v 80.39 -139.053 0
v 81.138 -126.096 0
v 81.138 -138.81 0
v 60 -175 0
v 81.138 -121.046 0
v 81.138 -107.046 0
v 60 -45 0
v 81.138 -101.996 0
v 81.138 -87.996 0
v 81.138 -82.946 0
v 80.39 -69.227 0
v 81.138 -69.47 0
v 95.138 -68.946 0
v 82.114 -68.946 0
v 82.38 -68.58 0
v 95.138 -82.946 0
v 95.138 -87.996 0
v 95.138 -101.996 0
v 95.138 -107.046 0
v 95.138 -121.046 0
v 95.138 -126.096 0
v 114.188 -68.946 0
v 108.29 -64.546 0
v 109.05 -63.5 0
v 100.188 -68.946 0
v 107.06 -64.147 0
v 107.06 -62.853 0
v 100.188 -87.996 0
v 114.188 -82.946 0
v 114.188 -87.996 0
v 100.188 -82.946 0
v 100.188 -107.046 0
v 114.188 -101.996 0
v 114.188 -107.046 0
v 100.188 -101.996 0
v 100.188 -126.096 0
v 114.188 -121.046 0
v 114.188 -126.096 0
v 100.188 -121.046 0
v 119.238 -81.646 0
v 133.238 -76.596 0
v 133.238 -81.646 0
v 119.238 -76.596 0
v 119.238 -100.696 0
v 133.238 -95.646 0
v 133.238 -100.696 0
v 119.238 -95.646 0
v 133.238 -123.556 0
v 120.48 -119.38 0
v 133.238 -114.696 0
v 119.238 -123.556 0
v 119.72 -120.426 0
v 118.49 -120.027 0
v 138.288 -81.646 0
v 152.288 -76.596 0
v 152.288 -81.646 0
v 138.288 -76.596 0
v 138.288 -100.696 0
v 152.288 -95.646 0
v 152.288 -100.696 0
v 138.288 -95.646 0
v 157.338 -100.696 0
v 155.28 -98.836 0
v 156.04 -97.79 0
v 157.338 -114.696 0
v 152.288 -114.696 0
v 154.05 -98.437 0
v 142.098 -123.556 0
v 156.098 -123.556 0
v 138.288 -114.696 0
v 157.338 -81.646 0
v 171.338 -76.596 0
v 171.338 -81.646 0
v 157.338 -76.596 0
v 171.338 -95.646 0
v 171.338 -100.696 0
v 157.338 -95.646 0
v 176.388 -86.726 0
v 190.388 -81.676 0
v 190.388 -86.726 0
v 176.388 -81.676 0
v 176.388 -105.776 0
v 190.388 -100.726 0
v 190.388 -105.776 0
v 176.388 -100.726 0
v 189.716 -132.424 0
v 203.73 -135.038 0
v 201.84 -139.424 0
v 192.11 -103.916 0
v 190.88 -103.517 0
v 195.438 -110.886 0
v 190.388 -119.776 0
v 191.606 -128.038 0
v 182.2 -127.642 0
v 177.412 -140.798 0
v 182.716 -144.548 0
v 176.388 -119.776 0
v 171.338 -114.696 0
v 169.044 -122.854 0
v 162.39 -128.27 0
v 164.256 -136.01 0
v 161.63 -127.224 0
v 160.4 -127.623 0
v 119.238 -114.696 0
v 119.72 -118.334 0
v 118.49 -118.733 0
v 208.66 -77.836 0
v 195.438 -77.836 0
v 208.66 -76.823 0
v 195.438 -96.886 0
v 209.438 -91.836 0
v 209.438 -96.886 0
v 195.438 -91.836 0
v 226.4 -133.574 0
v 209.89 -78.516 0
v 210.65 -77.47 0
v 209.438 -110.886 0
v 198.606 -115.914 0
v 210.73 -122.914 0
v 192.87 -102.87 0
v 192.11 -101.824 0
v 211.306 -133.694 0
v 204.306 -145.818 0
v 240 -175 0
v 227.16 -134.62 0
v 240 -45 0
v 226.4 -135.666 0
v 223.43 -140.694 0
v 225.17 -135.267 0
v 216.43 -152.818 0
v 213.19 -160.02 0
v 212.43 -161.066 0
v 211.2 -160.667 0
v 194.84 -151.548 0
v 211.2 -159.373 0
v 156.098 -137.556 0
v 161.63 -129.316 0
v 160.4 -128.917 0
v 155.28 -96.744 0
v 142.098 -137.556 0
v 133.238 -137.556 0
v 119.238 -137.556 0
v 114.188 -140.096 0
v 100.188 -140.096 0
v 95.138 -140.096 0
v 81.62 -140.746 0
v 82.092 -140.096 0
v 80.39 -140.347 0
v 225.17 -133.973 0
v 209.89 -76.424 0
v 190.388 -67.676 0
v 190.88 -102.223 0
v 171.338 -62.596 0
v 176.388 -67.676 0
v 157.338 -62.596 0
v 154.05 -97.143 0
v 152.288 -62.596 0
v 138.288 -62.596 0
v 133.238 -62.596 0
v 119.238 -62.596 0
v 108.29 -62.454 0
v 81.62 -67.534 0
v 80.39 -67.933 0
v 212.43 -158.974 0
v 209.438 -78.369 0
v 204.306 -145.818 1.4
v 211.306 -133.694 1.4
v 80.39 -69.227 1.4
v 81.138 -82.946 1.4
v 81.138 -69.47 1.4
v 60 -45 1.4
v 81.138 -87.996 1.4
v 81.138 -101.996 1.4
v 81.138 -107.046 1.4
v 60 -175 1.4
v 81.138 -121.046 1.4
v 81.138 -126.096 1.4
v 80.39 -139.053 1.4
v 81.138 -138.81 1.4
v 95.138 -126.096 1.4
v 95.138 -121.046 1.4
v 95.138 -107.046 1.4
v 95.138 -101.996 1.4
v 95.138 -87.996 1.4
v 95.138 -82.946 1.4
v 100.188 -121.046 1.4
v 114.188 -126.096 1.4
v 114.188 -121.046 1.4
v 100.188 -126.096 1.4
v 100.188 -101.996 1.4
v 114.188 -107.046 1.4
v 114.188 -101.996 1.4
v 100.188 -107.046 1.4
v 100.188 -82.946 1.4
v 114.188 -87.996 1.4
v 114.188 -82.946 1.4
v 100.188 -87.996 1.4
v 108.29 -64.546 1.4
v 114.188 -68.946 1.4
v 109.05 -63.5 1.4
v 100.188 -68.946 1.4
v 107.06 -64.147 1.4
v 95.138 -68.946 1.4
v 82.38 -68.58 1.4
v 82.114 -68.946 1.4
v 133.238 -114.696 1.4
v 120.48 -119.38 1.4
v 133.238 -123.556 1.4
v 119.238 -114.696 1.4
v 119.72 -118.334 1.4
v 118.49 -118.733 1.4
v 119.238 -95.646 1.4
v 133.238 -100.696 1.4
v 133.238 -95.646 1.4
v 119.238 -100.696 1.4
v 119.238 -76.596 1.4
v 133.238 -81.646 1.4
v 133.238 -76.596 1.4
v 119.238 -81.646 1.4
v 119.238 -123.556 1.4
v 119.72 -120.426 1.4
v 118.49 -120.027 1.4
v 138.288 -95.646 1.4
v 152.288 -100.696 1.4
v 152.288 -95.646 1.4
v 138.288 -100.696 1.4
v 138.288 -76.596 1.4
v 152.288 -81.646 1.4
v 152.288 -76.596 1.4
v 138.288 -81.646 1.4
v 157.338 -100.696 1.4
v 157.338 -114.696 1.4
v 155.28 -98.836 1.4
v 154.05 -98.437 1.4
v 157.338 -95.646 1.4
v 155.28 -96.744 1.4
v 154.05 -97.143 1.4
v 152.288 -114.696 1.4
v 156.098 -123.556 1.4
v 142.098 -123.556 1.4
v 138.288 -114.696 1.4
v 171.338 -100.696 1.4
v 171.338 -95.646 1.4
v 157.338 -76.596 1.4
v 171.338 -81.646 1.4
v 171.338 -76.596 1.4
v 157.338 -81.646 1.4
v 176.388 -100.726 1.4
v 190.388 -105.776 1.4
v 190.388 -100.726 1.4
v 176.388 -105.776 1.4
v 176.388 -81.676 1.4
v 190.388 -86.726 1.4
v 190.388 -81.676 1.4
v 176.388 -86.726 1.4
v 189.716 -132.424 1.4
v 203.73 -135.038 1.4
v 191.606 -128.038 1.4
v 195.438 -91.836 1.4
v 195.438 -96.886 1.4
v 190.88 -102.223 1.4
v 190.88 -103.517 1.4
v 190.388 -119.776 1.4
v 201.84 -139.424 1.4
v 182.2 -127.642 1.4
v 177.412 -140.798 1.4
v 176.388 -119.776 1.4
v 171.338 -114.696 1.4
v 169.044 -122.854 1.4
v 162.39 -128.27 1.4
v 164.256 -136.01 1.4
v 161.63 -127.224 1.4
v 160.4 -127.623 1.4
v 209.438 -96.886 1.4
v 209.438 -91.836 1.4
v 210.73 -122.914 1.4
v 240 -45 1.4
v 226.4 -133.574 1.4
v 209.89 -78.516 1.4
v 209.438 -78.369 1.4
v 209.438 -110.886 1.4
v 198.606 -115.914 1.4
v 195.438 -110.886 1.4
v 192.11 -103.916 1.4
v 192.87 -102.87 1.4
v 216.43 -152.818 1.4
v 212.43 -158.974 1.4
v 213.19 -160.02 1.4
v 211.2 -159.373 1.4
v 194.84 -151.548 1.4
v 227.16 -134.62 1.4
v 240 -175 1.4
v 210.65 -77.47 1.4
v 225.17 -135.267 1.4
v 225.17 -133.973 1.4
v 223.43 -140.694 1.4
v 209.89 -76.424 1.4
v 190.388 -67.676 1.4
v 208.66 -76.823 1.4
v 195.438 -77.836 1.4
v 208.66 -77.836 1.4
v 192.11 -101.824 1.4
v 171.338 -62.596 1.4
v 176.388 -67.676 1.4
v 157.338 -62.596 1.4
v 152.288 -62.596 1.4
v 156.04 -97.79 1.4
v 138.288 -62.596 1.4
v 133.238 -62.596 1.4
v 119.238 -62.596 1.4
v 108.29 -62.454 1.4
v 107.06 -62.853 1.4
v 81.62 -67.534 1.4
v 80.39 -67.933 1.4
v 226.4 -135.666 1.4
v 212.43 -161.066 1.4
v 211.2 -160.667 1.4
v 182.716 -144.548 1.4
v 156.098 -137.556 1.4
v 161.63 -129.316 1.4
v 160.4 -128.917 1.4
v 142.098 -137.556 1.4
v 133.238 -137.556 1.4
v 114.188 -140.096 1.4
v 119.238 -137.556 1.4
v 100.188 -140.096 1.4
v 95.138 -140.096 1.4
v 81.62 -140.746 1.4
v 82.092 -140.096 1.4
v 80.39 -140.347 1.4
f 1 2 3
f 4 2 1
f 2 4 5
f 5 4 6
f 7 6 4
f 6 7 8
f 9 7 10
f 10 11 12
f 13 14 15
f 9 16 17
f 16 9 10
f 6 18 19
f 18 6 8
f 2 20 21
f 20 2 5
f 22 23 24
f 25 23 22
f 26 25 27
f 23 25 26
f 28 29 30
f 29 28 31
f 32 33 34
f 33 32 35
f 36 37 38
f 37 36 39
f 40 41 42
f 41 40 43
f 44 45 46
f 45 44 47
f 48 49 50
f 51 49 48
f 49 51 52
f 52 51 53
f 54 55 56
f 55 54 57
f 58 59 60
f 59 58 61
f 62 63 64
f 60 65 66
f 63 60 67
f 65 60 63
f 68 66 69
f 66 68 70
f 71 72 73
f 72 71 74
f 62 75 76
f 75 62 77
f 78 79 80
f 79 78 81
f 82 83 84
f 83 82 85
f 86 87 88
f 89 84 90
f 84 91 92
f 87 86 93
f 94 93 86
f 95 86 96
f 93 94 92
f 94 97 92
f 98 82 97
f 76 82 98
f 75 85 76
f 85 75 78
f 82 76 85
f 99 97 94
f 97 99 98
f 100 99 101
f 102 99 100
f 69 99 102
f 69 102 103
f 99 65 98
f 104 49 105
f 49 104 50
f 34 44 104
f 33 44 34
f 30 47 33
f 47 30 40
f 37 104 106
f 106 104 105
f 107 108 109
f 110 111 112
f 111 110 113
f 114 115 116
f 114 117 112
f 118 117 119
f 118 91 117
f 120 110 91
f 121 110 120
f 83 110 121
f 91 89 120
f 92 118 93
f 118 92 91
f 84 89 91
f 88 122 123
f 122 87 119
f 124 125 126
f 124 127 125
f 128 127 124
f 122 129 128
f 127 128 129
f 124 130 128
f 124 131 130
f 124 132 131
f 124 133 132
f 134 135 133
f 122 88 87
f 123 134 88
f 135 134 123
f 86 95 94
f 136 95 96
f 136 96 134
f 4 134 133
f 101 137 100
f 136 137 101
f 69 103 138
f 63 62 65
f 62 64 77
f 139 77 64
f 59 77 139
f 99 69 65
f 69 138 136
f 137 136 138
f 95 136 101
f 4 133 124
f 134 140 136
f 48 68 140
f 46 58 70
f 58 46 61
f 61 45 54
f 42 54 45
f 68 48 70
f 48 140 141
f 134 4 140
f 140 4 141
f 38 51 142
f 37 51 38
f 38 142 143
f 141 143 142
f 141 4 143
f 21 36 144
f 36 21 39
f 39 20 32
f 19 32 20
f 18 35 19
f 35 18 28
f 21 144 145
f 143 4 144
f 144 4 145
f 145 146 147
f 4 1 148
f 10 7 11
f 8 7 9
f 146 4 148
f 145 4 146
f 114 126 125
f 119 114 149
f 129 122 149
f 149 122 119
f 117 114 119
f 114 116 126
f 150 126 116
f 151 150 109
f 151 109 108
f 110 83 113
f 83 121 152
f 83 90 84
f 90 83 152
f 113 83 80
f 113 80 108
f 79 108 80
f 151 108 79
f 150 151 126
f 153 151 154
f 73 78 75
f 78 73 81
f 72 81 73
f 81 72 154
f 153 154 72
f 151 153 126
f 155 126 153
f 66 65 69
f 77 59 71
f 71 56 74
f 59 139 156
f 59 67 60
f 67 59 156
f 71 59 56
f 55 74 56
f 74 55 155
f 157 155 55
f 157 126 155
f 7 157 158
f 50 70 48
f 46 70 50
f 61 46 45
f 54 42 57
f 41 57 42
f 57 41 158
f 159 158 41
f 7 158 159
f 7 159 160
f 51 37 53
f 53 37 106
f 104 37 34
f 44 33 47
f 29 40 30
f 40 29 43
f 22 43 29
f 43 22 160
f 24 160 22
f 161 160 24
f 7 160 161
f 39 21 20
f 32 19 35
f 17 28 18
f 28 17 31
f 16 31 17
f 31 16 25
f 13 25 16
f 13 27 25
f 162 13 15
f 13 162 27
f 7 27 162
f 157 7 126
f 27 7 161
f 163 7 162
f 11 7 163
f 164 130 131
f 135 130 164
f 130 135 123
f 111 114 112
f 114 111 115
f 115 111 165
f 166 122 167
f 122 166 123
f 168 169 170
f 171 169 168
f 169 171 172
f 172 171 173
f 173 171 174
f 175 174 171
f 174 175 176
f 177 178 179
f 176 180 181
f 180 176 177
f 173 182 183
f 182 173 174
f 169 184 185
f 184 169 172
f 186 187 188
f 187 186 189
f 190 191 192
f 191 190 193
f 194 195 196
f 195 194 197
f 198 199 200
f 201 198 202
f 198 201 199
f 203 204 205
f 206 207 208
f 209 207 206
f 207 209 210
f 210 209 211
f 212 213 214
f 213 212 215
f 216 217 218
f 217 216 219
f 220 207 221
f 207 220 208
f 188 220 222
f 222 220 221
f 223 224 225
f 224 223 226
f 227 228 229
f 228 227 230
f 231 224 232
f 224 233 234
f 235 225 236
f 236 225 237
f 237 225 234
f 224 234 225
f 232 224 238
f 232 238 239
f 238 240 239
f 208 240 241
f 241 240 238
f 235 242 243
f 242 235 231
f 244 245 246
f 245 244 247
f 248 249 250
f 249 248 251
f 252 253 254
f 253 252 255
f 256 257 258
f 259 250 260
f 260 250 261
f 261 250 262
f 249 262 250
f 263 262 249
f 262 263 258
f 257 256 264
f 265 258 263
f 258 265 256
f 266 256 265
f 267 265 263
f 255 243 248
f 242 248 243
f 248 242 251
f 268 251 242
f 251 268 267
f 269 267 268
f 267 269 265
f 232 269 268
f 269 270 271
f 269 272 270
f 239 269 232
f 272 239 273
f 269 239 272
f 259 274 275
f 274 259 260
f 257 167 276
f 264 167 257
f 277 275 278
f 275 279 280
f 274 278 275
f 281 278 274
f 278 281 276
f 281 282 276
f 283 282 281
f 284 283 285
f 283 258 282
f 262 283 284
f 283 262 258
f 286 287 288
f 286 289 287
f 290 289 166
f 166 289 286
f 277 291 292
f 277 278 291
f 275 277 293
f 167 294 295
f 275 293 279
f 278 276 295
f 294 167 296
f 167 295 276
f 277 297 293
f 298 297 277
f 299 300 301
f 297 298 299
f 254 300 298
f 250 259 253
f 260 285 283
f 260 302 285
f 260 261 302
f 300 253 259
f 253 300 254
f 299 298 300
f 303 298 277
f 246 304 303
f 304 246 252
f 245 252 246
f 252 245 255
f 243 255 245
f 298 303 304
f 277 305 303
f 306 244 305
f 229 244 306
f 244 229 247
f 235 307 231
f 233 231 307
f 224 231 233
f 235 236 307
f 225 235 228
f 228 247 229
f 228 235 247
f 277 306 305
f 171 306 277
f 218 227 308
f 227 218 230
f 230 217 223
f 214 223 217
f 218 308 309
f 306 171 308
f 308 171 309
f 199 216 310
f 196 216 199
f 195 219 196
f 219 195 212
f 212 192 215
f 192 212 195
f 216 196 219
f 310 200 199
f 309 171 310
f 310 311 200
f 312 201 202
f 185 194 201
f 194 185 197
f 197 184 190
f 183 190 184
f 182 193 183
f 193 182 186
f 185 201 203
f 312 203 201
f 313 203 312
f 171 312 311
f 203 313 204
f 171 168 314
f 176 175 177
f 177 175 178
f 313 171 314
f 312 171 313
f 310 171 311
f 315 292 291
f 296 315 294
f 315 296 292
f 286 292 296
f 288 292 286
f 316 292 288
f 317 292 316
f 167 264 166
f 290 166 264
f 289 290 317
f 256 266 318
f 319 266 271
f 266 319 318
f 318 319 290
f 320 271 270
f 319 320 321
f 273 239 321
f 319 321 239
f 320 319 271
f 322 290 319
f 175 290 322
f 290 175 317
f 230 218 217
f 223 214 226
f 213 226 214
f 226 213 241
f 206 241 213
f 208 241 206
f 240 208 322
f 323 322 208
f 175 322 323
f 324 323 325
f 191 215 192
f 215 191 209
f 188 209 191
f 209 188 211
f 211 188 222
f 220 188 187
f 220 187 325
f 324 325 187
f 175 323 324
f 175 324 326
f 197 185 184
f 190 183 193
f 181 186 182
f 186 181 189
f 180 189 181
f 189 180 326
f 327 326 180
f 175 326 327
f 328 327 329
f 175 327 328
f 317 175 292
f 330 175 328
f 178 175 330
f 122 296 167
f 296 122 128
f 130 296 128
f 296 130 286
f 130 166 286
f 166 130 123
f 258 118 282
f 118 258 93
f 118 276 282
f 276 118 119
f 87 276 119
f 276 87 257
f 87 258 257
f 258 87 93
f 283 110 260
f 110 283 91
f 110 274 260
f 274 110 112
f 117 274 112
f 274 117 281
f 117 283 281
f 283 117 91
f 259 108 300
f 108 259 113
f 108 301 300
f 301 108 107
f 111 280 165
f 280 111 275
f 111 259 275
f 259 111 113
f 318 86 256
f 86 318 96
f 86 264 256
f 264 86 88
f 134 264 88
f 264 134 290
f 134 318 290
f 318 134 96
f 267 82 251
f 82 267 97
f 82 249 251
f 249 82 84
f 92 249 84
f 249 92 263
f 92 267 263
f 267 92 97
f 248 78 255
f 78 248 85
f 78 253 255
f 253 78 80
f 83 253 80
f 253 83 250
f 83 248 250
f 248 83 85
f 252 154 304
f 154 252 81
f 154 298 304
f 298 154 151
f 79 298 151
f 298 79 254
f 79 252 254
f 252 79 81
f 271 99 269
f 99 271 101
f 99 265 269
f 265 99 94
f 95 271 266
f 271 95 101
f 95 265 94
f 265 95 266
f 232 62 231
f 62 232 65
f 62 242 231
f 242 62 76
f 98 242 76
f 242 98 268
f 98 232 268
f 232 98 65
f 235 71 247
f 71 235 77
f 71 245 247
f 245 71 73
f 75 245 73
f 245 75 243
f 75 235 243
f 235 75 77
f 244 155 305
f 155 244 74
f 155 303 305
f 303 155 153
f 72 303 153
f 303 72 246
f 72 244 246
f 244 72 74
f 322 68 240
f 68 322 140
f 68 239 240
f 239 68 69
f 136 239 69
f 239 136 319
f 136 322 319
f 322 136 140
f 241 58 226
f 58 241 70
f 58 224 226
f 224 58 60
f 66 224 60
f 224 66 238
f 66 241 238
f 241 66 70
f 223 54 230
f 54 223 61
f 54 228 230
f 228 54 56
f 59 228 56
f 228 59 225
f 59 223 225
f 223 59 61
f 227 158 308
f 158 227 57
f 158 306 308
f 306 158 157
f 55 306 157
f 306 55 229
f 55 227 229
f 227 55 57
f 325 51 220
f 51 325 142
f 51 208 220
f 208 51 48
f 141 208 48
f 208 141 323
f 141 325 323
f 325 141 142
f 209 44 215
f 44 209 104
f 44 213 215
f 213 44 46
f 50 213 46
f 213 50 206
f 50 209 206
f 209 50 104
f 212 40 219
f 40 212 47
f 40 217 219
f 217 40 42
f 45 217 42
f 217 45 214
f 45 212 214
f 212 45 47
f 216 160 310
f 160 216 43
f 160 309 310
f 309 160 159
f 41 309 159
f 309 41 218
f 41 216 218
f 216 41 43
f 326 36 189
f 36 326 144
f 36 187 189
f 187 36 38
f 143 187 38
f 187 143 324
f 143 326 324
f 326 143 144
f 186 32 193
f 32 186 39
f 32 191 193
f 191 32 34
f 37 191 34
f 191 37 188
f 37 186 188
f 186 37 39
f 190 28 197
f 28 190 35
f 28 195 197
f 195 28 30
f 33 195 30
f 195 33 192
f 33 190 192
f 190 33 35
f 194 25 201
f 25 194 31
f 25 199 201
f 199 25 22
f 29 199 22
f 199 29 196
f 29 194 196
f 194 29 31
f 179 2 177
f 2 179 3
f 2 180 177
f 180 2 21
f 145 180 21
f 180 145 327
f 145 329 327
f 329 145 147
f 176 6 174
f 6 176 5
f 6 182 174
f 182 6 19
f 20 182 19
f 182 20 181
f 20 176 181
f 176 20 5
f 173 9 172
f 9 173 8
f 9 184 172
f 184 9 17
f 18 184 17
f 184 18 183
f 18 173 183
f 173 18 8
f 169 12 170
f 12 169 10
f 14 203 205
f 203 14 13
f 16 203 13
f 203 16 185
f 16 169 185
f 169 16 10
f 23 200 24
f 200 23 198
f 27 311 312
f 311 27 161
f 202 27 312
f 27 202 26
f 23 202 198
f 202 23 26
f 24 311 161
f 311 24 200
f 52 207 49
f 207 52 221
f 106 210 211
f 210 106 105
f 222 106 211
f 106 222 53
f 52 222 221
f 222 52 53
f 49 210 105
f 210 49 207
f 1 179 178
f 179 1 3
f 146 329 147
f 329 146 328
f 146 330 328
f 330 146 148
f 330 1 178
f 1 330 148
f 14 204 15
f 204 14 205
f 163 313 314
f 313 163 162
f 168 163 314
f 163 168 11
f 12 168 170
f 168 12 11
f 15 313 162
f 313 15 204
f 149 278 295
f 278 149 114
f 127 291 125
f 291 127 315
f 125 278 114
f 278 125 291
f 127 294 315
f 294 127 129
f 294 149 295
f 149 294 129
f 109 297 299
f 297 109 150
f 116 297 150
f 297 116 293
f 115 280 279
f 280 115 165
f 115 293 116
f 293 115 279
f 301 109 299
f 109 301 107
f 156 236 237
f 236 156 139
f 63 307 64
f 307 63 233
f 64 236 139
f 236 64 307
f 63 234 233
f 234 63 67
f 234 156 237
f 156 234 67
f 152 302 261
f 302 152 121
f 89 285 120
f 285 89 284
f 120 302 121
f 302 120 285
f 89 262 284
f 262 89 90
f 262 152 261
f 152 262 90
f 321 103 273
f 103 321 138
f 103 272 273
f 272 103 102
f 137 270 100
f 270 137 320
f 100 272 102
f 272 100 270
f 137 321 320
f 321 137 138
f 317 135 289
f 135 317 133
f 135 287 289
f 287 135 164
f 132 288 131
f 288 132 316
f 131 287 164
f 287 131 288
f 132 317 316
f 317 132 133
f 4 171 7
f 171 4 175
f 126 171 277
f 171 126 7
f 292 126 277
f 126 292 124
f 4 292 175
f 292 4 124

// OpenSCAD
difference(){
    linear_extrude(1.4) translate(v = [150, -110, 0.0000000000]) square([180, 130], true);
    linear_extrude(1.4) import (file = "./right-Edge_Cuts.dxf");
union() {
	linear_extrude(height = 1.4000000000) {
		translate(v = [213.8680000000, -143.2560000000, 0.0000000000]) {
			rotate(a = 330, v = [0, 0, 1]) {
				square(center = true, size = 14);
			}
		}
	}
	linear_extrude(height = 1.4000000000) {
		translate(v = [201.1680000000, -125.4760000000, 0.0000000000]) {
			rotate(a = 330, v = [0, 0, 1]) {
				square(center = true, size = 14);
			}
		}
	}
	linear_extrude(height = 1.4000000000) {
		translate(v = [202.4380000000, -103.8860000000, 0.0000000000]) {
			square(center = true, size = 14);
		}
	}
	linear_extrude(height = 1.4000000000) {
		translate(v = [202.4380000000, -84.8360000000, 0.0000000000]) {
			square(center = true, size = 14);
		}
	}
	linear_extrude(height = 1.4000000000) {
		translate(v = [192.2780000000, -141.9860000000, 0.0000000000]) {
			rotate(a = 330, v = [0, 0, 1]) {
				square(center = true, size = 14);
			}
		}
	}
	linear_extrude(height = 1.4000000000) {
		translate(v = [183.3880000000, -112.7760000000, 0.0000000000]) {
			square(center = true, size = 14);
		}
	}
	linear_extrude(height = 1.4000000000) {
		translate(v = [183.3880000000, -93.7260000000, 0.0000000000]) {
			square(center = true, size = 14);
		}
	}
	linear_extrude(height = 1.4000000000) {
		translate(v = [183.3880000000, -74.6760000000, 0.0000000000]) {
			square(center = true, size = 14);
		}
	}
	linear_extrude(height = 1.4000000000) {
		translate(v = [173.2280000000, -131.8260000000, 0.0000000000]) {
			rotate(a = 340, v = [0, 0, 1]) {
				square(center = true, size = 14);
			}
		}
	}
	linear_extrude(height = 1.4000000000) {
		translate(v = [164.3380000000, -107.6960000000, 0.0000000000]) {
			square(center = true, size = 14);
		}
	}
	linear_extrude(height = 1.4000000000) {
		translate(v = [164.3380000000, -88.6460000000, 0.0000000000]) {
			square(center = true, size = 14);
		}
	}
	linear_extrude(height = 1.4000000000) {
		translate(v = [164.3380000000, -69.5960000000, 0.0000000000]) {
			square(center = true, size = 14);
		}
	}
	linear_extrude(height = 1.4000000000) {
		translate(v = [149.0980000000, -130.5560000000, 0.0000000000]) {
			square(center = true, size = 14);
		}
	}
	linear_extrude(height = 1.4000000000) {
		translate(v = [145.2880000000, -107.6960000000, 0.0000000000]) {
			square(center = true, size = 14);
		}
	}
	linear_extrude(height = 1.4000000000) {
		translate(v = [145.2880000000, -88.6460000000, 0.0000000000]) {
			square(center = true, size = 14);
		}
	}
	linear_extrude(height = 1.4000000000) {
		translate(v = [145.2880000000, -69.5960000000, 0.0000000000]) {
			square(center = true, size = 14);
		}
	}
	linear_extrude(height = 1.4000000000) {
		translate(v = [126.2380000000, -130.5560000000, 0.0000000000]) {
			square(center = true, size = 14);
		}
	}
	linear_extrude(height = 1.4000000000) {
		translate(v = [126.2380000000, -107.6960000000, 0.0000000000]) {
			square(center = true, size = 14);
		}
	}
	linear_extrude(height = 1.4000000000) {
		translate(v = [126.2380000000, -88.6460000000, 0.0000000000]) {
			square(center = true, size = 14);
		}
	}
	linear_extrude(height = 1.4000000000) {
		translate(v = [126.2380000000, -69.5960000000, 0.0000000000]) {
			square(center = true, size = 14);
		}
	}
	linear_extrude(height = 1.4000000000) {
		translate(v = [107.1880000000, -133.0960000000, 0.0000000000]) {
			square(center = true, size = 14);
		}
	}
	linear_extrude(height = 1.4000000000) {
		translate(v = [107.1880000000, -114.0460000000, 0.0000000000]) {
			square(center = true, size = 14);
		}
	}
	linear_extrude(height = 1.4000000000) {
		translate(v = [107.1880000000, -94.9960000000, 0.0000000000]) {
			square(center = true, size = 14);
		}
	}
	linear_extrude(height = 1.4000000000) {
		translate(v = [107.1880000000, -75.9460000000, 0.0000000000]) {
			square(center = true, size = 14);
		}
	}
	linear_extrude(height = 1.4000000000) {
		translate(v = [88.1380000000, -133.0960000000, 0.0000000000]) {
			square(center = true, size = 14);
		}
	}
	linear_extrude(height = 1.4000000000) {
		translate(v = [88.1380000000, -114.0460000000, 0.0000000000]) {
			square(center = true, size = 14);
		}
	}
	linear_extrude(height = 1.4000000000) {
		translate(v = [88.1380000000, -94.9960000000, 0.0000000000]) {
			square(center = true, size = 14);
		}
	}
	linear_extrude(height = 1.4000000000) {
		translate(v = [88.1380000000, -75.9460000000, 0.0000000000]) {
			square(center = true, size = 14);
		}
	}
	linear_extrude(height = 1.4000000000) {
		translate(v = [107.9500000000, -63.5000000000, 0.0000000000]) {
			circle(r = 1.1000000000);
		}
	}
	linear_extrude(height = 1.4000000000) {
		translate(v = [119.3800000000, -119.3800000000, 0.0000000000]) {
			circle(r = 1.1000000000);
		}
	}
	linear_extrude(height = 1.4000000000) {
		translate(v = [81.2800000000, -139.7000000000, 0.0000000000]) {
			circle(r = 1.1000000000);
		}
	}
	linear_extrude(height = 1.4000000000) {
		translate(v = [81.2800000000, -68.5800000000, 0.0000000000]) {
			circle(r = 1.1000000000);
		}
	}
	linear_extrude(height = 1.4000000000) {
		translate(v = [226.0600000000, -134.6200000000, 0.0000000000]) {
			circle(r = 1.1000000000);
		}
	}
	linear_extrude(height = 1.4000000000) {
		translate(v = [209.5500000000, -77.4700000000, 0.0000000000]) {
			circle(r = 1.1000000000);
		}
	}
	linear_extrude(height = 1.4000000000) {
		translate(v = [154.9400000000, -97.7900000000, 0.0000000000]) {
			circle(r = 1.1000000000);
		}
	}
	linear_extrude(height = 1.4000000000) {
		translate(v = [191.7700000000, -102.8700000000, 0.0000000000]) {
			circle(r = 1.1000000000);
		}
	}
	linear_extrude(height = 1.4000000000) {
		translate(v = [161.2900000000, -128.2700000000, 0.0000000000]) {
			circle(r = 1.1000000000);
		}
	}
	linear_extrude(height = 1.4000000000) {
		translate(v = [212.0900000000, -160.0200000000, 0.0000000000]) {
			circle(r = 1.1000000000);
		}
	}
};
    }
